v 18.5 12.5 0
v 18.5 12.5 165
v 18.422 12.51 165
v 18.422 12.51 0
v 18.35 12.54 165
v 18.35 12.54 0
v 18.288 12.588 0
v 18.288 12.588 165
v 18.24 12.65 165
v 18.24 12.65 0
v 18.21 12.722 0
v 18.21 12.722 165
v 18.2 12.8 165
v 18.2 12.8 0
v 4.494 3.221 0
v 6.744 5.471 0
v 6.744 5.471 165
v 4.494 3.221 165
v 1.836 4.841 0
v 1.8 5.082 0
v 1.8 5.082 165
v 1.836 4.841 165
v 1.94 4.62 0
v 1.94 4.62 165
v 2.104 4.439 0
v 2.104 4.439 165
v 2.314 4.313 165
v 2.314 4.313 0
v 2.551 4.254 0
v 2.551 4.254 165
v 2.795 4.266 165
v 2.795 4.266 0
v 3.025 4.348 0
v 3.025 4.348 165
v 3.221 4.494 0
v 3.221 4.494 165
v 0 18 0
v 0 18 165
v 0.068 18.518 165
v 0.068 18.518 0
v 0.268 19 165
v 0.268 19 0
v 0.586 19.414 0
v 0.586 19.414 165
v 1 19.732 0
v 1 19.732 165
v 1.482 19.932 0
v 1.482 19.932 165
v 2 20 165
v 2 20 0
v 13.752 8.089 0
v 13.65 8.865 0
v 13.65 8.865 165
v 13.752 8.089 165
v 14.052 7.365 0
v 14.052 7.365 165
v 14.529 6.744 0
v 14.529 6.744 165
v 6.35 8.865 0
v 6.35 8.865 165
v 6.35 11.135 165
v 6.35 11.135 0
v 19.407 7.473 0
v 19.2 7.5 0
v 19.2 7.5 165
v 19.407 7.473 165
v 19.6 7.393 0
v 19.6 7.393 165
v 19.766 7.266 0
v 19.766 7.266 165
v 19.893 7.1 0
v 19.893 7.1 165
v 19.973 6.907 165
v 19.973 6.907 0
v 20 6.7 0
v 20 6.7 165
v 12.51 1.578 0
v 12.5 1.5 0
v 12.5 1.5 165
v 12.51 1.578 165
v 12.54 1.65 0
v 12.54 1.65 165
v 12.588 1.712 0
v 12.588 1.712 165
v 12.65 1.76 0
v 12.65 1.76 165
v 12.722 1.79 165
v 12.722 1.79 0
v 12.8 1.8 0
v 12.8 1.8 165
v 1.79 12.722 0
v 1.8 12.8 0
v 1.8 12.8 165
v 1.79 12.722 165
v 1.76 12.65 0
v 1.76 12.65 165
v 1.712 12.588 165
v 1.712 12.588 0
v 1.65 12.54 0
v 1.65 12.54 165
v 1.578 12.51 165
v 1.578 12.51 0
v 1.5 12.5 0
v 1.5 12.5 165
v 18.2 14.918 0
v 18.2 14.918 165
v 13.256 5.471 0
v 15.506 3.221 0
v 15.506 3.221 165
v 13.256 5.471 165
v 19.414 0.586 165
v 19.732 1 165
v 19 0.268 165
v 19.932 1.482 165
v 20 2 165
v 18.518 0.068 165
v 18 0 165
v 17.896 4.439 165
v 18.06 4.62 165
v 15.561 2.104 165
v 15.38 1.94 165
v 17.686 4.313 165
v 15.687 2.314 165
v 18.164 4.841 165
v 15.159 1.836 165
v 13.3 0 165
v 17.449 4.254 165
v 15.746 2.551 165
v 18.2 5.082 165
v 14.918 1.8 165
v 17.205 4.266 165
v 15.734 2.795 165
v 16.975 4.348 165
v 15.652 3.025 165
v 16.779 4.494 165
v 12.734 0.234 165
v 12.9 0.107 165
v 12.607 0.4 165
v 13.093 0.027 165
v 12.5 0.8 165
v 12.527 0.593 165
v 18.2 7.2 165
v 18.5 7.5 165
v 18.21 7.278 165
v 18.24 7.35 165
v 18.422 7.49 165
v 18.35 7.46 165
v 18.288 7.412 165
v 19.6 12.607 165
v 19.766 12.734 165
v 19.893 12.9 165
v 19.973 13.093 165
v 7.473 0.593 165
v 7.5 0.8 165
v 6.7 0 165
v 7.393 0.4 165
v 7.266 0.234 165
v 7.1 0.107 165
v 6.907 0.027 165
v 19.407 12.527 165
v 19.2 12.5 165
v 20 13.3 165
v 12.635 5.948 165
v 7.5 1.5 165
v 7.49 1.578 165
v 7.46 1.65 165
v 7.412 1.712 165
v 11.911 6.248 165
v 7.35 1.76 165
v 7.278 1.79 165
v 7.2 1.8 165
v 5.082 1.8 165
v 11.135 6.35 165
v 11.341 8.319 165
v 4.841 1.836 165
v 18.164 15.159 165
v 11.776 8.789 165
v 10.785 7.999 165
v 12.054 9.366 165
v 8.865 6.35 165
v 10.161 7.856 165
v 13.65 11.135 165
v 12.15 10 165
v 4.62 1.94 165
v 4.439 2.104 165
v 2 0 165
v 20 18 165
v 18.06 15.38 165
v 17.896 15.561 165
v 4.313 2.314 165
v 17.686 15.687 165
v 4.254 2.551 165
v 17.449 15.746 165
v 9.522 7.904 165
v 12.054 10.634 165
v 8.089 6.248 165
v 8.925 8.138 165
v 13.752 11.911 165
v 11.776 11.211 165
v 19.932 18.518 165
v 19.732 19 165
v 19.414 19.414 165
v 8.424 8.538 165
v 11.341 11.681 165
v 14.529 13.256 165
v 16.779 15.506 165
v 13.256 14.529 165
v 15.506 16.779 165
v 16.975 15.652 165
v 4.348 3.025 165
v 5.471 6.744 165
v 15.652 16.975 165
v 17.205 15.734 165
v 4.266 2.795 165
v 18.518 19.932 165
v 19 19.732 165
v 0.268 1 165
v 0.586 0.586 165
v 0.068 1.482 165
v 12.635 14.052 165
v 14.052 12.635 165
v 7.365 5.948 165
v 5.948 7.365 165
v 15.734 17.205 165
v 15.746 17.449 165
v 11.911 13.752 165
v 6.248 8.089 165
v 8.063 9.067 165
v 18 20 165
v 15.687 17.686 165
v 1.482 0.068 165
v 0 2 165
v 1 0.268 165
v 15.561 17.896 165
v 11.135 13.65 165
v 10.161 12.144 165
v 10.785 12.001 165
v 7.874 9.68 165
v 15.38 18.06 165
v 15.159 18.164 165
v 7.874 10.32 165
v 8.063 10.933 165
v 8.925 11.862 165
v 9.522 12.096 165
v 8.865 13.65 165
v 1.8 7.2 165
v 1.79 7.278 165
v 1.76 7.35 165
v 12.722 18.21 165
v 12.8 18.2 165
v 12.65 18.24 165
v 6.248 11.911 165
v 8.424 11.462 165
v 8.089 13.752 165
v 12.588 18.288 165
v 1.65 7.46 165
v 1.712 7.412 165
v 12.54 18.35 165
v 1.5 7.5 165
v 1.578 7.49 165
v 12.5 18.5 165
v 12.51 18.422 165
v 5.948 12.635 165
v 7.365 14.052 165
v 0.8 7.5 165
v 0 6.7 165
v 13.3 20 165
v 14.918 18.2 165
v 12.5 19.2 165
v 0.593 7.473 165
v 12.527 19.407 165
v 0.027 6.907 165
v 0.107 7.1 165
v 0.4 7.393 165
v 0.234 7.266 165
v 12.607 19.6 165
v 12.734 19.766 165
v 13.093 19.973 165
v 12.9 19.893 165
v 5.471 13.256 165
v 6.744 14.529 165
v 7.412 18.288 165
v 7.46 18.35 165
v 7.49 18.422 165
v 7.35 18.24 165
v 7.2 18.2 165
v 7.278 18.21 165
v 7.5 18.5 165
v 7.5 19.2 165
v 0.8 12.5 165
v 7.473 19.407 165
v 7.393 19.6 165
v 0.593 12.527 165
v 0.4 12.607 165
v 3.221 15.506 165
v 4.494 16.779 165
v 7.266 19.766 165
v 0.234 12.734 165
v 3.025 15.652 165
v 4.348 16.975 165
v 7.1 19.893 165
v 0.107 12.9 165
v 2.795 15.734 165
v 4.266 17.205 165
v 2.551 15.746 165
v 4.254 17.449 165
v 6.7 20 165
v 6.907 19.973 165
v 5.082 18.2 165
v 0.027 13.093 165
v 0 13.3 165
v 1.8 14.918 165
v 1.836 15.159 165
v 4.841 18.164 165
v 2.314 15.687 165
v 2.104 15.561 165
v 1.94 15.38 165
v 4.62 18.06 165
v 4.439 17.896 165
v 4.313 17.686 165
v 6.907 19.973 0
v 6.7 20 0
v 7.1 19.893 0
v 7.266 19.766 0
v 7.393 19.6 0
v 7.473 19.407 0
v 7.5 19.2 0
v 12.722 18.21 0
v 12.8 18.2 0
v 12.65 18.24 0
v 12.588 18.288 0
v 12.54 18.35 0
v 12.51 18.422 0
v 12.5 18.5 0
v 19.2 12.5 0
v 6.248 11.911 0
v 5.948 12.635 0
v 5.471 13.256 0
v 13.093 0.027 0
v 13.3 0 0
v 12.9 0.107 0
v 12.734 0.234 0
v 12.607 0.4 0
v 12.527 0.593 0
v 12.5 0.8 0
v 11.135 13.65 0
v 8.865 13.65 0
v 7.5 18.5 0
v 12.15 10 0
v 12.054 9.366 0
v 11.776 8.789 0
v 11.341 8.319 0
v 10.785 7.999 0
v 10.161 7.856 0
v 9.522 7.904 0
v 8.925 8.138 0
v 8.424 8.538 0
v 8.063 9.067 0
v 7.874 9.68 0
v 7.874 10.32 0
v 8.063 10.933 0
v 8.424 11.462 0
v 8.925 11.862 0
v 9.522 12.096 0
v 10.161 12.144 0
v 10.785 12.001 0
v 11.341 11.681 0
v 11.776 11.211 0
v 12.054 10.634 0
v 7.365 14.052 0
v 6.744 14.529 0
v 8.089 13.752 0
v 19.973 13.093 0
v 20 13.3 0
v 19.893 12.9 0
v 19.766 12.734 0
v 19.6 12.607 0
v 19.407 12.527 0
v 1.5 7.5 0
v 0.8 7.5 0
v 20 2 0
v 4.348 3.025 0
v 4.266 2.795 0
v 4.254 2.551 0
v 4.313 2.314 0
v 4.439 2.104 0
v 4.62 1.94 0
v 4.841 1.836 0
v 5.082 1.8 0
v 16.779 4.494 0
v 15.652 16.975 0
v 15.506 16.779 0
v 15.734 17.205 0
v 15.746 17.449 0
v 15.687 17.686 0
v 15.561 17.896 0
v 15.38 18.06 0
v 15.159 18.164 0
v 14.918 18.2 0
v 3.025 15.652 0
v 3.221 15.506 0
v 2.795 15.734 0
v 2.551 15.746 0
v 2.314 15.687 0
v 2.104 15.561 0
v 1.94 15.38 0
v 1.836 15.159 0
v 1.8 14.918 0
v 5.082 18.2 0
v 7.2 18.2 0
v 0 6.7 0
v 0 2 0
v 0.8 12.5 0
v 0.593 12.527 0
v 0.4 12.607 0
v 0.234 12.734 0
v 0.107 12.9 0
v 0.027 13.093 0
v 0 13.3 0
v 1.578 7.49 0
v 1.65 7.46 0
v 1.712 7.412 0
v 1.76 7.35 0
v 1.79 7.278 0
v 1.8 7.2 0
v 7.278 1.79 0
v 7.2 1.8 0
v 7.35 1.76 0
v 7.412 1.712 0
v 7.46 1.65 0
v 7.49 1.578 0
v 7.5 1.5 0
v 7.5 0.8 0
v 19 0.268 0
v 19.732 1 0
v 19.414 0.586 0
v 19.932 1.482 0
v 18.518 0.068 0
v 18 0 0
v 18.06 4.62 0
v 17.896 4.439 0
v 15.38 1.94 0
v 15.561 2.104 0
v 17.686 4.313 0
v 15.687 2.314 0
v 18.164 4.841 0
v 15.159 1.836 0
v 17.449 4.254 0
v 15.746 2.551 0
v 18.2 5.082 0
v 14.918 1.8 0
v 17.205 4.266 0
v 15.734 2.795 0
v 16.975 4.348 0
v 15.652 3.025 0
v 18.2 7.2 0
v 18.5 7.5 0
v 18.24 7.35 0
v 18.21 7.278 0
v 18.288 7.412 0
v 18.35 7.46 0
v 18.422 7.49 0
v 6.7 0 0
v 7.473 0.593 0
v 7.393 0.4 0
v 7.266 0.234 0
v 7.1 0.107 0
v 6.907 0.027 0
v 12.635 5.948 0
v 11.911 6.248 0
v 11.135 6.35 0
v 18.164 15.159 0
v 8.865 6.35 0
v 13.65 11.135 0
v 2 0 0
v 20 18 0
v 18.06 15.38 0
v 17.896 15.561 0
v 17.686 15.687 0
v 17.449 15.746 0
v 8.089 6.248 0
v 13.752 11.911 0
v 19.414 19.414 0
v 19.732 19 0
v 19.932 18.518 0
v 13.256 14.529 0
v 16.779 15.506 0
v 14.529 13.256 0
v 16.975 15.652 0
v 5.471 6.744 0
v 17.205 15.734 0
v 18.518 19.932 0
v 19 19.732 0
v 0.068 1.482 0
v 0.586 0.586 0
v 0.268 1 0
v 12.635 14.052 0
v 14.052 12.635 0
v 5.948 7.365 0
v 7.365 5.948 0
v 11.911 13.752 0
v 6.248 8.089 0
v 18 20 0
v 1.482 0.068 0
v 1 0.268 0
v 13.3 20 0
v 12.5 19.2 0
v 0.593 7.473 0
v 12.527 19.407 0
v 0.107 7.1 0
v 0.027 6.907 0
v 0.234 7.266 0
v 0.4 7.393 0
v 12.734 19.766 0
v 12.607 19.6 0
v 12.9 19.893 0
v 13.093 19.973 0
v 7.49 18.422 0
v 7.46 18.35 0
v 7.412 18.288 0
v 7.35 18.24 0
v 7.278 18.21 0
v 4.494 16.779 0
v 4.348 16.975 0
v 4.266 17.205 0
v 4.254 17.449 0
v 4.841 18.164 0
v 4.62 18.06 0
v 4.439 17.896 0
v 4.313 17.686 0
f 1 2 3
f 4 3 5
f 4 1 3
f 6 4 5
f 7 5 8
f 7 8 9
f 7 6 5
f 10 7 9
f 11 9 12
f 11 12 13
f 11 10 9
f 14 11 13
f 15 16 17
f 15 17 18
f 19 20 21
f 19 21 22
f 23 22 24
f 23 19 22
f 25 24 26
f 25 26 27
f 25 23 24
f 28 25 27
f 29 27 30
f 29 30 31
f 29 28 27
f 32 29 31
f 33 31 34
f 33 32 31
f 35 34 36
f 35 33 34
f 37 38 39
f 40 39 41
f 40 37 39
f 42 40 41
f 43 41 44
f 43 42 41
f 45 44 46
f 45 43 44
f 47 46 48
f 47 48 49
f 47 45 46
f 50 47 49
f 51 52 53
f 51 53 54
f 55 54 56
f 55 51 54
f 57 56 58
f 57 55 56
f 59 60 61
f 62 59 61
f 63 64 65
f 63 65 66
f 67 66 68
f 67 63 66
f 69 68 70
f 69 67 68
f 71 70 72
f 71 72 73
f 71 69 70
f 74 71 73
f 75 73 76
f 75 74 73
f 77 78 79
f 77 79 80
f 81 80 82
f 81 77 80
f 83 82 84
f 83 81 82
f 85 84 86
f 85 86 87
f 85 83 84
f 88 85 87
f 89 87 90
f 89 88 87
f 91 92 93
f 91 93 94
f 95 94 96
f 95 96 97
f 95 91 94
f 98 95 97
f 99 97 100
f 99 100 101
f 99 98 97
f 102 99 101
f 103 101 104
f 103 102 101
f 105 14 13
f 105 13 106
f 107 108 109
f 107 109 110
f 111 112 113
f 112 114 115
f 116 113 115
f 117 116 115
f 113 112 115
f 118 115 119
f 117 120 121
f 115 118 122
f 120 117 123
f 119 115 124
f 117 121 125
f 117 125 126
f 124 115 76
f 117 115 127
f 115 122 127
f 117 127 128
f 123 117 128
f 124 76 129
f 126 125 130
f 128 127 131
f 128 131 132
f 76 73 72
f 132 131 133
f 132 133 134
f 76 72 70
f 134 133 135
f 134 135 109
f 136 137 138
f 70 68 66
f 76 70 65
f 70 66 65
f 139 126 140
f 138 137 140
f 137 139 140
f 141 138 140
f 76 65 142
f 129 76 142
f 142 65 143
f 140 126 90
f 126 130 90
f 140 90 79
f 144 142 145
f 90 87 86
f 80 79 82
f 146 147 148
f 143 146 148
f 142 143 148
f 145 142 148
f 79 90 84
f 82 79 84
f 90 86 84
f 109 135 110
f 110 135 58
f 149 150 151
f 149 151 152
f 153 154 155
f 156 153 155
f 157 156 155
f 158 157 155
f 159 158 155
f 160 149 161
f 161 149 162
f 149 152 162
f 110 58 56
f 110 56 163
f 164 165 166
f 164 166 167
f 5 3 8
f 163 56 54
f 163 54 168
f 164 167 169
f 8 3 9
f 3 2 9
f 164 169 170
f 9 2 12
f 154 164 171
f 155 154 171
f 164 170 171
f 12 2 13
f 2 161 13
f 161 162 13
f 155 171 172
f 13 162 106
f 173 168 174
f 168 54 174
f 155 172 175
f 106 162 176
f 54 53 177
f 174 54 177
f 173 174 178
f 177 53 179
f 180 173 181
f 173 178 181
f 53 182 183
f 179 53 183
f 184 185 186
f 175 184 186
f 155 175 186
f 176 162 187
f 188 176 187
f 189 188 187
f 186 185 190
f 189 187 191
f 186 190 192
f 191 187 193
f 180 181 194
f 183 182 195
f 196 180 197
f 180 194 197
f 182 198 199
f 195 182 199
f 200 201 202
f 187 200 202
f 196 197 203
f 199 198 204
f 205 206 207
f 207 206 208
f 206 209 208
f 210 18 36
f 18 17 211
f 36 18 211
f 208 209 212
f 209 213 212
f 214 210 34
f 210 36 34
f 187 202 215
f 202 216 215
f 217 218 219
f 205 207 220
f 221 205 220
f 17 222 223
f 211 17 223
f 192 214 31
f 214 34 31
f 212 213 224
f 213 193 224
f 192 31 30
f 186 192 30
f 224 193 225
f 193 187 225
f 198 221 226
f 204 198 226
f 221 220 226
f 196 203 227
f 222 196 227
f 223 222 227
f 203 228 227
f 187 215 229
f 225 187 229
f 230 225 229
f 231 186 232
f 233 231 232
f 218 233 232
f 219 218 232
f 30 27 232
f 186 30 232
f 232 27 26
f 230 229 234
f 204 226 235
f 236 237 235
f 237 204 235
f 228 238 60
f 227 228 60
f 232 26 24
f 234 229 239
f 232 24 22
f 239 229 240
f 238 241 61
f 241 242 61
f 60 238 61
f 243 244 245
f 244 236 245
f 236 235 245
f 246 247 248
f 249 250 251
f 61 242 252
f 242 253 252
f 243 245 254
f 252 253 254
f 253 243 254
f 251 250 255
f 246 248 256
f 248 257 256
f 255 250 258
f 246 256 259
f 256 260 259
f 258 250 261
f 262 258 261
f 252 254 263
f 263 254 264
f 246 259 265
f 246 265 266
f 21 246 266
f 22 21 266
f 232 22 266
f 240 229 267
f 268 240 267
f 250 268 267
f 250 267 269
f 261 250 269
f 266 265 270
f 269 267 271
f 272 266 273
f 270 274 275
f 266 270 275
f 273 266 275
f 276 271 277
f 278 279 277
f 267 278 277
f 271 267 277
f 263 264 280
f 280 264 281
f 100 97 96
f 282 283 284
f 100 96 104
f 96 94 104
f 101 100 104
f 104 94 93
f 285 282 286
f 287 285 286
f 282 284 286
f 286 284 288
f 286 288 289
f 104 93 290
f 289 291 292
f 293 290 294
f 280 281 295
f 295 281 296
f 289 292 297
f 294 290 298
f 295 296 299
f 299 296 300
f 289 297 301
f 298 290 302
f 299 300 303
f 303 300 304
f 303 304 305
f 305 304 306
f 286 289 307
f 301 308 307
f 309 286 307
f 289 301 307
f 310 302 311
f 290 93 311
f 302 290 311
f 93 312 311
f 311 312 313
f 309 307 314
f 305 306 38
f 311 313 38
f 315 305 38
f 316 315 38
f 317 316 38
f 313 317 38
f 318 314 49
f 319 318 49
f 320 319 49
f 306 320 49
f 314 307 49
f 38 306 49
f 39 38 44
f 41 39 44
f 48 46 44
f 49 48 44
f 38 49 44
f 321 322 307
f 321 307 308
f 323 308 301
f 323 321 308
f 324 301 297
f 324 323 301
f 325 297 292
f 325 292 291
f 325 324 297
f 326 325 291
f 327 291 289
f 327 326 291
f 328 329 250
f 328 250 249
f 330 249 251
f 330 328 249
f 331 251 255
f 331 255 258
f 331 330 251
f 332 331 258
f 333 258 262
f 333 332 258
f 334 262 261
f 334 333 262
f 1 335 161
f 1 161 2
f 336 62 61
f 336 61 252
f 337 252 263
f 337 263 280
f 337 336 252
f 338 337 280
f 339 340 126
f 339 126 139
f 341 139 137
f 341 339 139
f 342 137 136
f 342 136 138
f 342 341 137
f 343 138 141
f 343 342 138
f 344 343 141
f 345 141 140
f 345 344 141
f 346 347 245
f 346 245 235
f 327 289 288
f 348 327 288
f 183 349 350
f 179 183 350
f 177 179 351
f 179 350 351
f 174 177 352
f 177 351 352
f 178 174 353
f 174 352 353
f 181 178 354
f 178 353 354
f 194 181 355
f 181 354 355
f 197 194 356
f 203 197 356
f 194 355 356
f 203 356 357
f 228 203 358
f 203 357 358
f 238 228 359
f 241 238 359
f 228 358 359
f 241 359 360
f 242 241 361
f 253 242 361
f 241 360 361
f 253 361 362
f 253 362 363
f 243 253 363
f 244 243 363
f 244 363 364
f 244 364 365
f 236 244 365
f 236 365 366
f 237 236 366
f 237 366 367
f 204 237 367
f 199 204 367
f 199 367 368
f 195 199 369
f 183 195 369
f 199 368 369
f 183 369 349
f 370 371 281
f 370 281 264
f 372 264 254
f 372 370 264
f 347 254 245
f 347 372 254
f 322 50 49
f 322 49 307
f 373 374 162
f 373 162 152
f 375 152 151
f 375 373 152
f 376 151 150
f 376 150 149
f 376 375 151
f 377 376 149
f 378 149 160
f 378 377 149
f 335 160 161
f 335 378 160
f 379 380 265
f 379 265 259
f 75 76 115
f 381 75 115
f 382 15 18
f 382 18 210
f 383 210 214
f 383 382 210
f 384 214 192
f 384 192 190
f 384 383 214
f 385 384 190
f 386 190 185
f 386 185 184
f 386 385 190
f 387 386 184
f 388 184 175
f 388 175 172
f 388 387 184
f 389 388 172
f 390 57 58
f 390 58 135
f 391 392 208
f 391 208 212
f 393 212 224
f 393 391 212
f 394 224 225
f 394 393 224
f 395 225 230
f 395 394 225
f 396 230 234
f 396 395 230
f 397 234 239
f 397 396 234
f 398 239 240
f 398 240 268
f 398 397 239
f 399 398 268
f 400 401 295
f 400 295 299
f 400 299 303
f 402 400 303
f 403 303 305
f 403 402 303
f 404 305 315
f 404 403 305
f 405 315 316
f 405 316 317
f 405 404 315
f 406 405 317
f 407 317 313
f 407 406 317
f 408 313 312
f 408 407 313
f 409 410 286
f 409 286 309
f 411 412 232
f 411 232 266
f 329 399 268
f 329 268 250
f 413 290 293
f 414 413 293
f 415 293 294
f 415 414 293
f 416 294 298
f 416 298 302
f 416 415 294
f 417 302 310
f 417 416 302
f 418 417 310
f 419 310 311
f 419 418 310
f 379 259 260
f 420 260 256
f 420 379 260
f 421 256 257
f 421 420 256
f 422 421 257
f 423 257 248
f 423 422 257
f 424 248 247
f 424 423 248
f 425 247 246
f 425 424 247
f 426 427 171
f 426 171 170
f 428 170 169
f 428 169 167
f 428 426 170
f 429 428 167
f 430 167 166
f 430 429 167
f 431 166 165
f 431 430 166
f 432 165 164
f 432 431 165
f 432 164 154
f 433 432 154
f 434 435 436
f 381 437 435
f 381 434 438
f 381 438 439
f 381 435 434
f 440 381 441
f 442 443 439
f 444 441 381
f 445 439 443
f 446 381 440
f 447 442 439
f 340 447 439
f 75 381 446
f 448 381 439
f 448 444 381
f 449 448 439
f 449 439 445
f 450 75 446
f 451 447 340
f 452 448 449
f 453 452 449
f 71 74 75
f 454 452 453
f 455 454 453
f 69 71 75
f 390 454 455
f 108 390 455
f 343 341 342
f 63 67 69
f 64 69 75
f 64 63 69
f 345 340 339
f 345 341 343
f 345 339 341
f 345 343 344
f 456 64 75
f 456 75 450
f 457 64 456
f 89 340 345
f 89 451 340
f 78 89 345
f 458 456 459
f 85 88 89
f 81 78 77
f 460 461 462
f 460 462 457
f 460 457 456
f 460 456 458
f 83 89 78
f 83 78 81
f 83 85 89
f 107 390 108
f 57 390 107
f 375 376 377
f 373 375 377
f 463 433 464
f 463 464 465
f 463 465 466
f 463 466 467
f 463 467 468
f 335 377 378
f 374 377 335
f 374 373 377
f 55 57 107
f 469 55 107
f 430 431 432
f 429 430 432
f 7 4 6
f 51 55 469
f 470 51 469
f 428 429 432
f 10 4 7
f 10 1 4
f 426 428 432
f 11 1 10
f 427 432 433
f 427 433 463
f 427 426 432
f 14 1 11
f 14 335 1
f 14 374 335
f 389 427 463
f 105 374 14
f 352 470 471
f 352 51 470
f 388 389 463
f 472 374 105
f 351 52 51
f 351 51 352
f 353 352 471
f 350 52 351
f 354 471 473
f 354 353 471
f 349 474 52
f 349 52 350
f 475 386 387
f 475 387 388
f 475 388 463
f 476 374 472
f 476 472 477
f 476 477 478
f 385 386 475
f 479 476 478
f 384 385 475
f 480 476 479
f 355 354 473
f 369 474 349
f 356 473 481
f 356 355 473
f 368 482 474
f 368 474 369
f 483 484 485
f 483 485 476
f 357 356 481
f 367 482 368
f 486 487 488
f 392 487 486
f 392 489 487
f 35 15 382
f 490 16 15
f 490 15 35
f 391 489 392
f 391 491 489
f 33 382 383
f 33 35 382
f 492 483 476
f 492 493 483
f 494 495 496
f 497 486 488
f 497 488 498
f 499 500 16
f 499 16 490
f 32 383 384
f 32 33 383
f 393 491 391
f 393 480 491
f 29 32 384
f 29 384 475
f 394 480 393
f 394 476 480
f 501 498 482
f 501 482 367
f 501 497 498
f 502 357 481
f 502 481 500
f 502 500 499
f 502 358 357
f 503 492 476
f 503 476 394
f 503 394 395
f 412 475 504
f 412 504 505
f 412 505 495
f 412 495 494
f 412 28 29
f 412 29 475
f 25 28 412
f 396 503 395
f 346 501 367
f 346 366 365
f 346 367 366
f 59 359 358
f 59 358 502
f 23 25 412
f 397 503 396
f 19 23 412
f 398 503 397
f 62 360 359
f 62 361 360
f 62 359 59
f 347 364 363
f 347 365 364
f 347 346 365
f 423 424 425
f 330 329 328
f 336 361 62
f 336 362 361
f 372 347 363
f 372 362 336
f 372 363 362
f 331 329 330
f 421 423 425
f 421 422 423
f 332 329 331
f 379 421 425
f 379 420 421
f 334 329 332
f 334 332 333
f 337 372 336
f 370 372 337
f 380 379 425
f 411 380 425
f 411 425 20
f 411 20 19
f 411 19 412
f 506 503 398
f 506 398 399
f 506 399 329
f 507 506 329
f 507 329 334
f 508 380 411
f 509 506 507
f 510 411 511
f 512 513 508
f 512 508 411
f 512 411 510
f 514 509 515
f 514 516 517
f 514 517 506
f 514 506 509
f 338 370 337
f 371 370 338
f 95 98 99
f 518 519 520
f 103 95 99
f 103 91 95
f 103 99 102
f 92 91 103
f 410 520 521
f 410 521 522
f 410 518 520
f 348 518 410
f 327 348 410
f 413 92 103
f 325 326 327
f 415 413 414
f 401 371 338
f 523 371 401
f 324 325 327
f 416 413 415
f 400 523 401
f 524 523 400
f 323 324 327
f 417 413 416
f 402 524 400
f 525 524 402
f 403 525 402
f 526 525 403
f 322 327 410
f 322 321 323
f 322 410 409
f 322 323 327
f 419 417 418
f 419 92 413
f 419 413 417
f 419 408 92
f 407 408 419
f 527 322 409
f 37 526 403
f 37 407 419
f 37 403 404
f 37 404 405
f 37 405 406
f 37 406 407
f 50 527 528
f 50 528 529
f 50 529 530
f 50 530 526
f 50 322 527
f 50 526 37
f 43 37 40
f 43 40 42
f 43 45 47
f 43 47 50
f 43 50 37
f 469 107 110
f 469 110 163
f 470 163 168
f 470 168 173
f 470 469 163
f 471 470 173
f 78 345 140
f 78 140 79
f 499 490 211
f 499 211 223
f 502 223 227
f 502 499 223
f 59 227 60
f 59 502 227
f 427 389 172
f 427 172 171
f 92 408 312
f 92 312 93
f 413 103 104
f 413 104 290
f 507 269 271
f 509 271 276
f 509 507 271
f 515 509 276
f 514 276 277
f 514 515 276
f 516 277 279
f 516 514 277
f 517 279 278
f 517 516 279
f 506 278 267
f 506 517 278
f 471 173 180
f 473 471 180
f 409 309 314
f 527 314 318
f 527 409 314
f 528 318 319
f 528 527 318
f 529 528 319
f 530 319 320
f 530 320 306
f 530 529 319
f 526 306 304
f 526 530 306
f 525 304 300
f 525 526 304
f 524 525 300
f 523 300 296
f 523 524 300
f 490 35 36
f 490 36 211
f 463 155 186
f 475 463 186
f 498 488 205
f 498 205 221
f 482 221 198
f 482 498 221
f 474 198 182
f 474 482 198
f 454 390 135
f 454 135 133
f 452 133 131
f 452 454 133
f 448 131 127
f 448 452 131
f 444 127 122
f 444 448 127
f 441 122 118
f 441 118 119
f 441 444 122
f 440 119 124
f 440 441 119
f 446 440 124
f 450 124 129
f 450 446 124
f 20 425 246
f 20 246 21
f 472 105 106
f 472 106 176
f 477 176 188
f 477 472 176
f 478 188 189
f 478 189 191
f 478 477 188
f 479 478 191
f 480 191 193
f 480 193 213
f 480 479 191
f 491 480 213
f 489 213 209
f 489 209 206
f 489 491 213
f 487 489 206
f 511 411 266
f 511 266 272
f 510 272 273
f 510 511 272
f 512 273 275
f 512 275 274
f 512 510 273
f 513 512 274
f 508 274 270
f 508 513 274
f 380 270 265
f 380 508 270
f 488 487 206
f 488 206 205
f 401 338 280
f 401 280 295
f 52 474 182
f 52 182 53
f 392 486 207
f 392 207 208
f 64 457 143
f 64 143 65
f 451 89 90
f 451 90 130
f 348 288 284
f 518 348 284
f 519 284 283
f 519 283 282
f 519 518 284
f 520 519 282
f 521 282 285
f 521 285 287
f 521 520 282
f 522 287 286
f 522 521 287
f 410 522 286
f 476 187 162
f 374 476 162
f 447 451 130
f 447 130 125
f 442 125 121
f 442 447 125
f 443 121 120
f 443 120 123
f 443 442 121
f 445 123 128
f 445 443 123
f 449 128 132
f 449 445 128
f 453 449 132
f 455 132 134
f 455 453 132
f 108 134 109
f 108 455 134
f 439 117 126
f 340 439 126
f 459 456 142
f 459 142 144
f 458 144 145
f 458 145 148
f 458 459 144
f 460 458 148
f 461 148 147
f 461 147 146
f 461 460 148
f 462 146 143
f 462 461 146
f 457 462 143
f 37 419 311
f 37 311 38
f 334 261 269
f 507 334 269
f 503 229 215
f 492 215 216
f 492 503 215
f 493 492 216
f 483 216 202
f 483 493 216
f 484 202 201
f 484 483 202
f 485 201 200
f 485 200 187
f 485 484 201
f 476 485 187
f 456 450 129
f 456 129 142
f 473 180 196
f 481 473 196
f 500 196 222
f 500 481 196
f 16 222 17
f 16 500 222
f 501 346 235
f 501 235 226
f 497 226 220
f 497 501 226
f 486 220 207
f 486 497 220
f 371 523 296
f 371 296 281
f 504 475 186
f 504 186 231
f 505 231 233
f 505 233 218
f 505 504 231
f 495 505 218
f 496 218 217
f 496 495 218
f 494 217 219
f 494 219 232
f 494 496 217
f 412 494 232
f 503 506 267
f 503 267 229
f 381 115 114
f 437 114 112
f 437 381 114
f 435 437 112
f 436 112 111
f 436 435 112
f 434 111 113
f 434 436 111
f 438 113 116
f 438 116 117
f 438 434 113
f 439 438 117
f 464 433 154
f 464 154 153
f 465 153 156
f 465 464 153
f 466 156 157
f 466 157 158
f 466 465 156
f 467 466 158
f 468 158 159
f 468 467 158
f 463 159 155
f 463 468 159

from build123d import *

# Parameters (mm, degrees)
ESQUISSE1_R        = 2.15
BOSS_EXTRU_1_DEPTH = 165


with BuildPart() as part:
    # Esquisse1 → Boss.-Extru.1 (new body)
    with BuildSketch(Plane(origin=(0, 0, 0), x_dir=(-1, 0, 0), z_dir=(0, 0, -1))):
        with BuildLine():
            Line((-12.499999997, 0.800000003), (-12.499999998, 1.500000003))
            ThreePointArc((-12.499999998, 1.500000003), (-12.587867964, 1.712132039), (-12.8, 1.800000005))
            Line((-12.8, 1.800000005), (-14.9175884, 1.800000005))
            ThreePointArc((-14.9175884, 1.800000005), (-15.686636444, 2.31386148), (-15.50619229, 3.2210155))
            Line((-15.50619229, 3.2210155), (-13.25588745, 5.47132034))
            ThreePointArc((-13.25588745, 5.47132034), (-12.282617404, 6.121638593), (-11.134567108, 6.349999996))
            Line((-11.134567108, 6.349999996), (-8.865432907, 6.349999996))
            ThreePointArc((-8.865432907, 6.349999996), (-7.717382611, 6.121638594), (-6.744112567, 5.471320341))
            Line((-6.744112567, 5.471320341), (-4.493807729, 3.221015503))
            ThreePointArc((-4.493807729, 3.221015503), (-4.313363575, 2.313861481), (-5.082411621, 1.800000005))
            Line((-5.082411621, 1.800000005), (-7.20000001, 1.800000005))
            ThreePointArc((-7.20000001, 1.800000005), (-7.412132045, 1.71213204), (-7.50000001, 1.500000005))
            Line((-7.50000001, 1.500000005), (-7.50000001, 0.8))
            ThreePointArc((-7.50000001, 0.8), (-7.265685435, 0.234314575), (-6.70000001, 0))
            Line((-6.70000001, 0), (-2, 0))
            ThreePointArc((-2, 0), (-0.585786438, 0.585786438), (0, 2))
            Line((0, 2), (0, 6.699999998))
            ThreePointArc((0, 6.699999998), (-0.234314576, 7.265685424), (-0.800000003, 7.5))
            Line((-0.800000003, 7.5), (-1.50000001, 7.5))
            ThreePointArc((-1.50000001, 7.5), (-1.712132046, 7.412132033), (-1.800000013, 7.199999997))
            Line((-1.800000013, 7.199999997), (-1.800000013, 5.082411603))
            ThreePointArc((-1.800000013, 5.082411603), (-2.313861487, 4.31336356), (-3.221015507, 4.493807713))
            Line((-3.221015507, 4.493807713), (-5.471320347, 6.744112553))
            ThreePointArc((-5.471320347, 6.744112553), (-6.1216386, 7.717382599), (-6.350000003, 8.865432896))
            Line((-6.350000003, 8.865432896), (-6.350000003, 11.134567102))
            ThreePointArc((-6.350000003, 11.134567102), (-6.121638601, 12.282617397), (-5.471320348, 13.255887442))
            Line((-5.471320348, 13.255887442), (-3.221015512, 15.506192278))
            ThreePointArc((-3.221015512, 15.506192278), (-2.313861489, 15.686636432), (-1.800000013, 14.917588386))
            Line((-1.800000013, 14.917588386), (-1.800000013, 12.799999998))
            ThreePointArc((-1.800000013, 12.799999998), (-1.712132047, 12.587867963), (-1.500000013, 12.499999997))
            Line((-1.500000013, 12.499999997), (-0.8, 12.499999997))
            ThreePointArc((-0.8, 12.499999997), (-0.234314575, 12.734314573), (0, 13.299999998))
            Line((0, 13.299999998), (0, 18))
            ThreePointArc((0, 18), (-0.585786438, 19.414213562), (-2, 20))
            Line((-2, 20), (-6.700000008, 20))
            ThreePointArc((-6.700000008, 20), (-7.265685435, 19.765685424), (-7.50000001, 19.199999998))
            Line((-7.50000001, 19.199999998), (-7.50000001, 18.500000005))
            ThreePointArc((-7.50000001, 18.500000005), (-7.412132044, 18.287867969), (-7.200000008, 18.200000003))
            Line((-7.200000008, 18.200000003), (-5.082411594, 18.200000003))
            ThreePointArc((-5.082411594, 18.200000003), (-4.313363546, 17.686138526), (-4.493807701, 16.778984501))
            Line((-4.493807701, 16.778984501), (-6.744112542, 14.528679659))
            ThreePointArc((-6.744112542, 14.528679659), (-7.717382588, 13.878361406), (-8.865432885, 13.650000003))
            Line((-8.865432885, 13.650000003), (-11.134567112, 13.650000003))
            ThreePointArc((-11.134567112, 13.650000003), (-12.282617407, 13.878361405), (-13.255887452, 14.528679658))
            Line((-13.255887452, 14.528679658), (-15.506192292, 16.778984498))
            ThreePointArc((-15.506192292, 16.778984498), (-15.686636447, 17.686138525), (-14.917588397, 18.200000002))
            Line((-14.917588397, 18.200000002), (-12.799999998, 18.200000003))
            ThreePointArc((-12.799999998, 18.200000003), (-12.587867963, 18.287867968), (-12.499999997, 18.500000002))
            Line((-12.499999997, 18.500000002), (-12.499999997, 19.2))
            ThreePointArc((-12.499999997, 19.2), (-12.734314573, 19.765685425), (-13.299999998, 20))
            Line((-13.299999998, 20), (-18, 20))
            ThreePointArc((-18, 20), (-19.414213562, 19.414213562), (-20, 18))
            Line((-20, 18), (-20, 13.3))
            ThreePointArc((-20, 13.3), (-19.765685424, 12.734314573), (-19.199999998, 12.499999997))
            Line((-19.199999998, 12.499999997), (-18.500000003, 12.499999997))
            ThreePointArc((-18.500000003, 12.499999997), (-18.287867967, 12.587867964), (-18.2, 12.8))
            Line((-18.2, 12.8), (-18.2, 14.91758839))
            ThreePointArc((-18.2, 14.91758839), (-17.686138526, 15.686636434), (-16.778984506, 15.50619228))
            Line((-16.778984506, 15.50619228), (-14.528679657, 13.255887431))
            ThreePointArc((-14.528679657, 13.255887431), (-13.878361403, 12.282617385), (-13.650000001, 11.134567088))
            Line((-13.650000001, 11.134567088), (-13.650000001, 8.865432886))
            ThreePointArc((-13.650000001, 8.865432886), (-13.878361403, 7.717382591), (-14.528679656, 6.744112546))
            Line((-14.528679656, 6.744112546), (-16.778984496, 4.493807706))
            ThreePointArc((-16.778984496, 4.493807706), (-17.686138522, 4.313363551), (-18.2, 5.0824116))
            Line((-18.2, 5.0824116), (-18.2, 7.2))
            ThreePointArc((-18.2, 7.2), (-18.287867966, 7.412132034), (-18.5, 7.5))
            Line((-18.5, 7.5), (-19.2, 7.5))
            ThreePointArc((-19.2, 7.5), (-19.765685425, 7.265685425), (-20, 6.7))
            Line((-20, 6.7), (-20, 2))
            ThreePointArc((-20, 2), (-19.414213562, 0.585786438), (-18, 0))
            Line((-18, 0), (-13.3, 0))
            ThreePointArc((-13.3, 0), (-12.734314573, 0.234314576), (-12.499999997, 0.800000003))
        make_face()
        with Locations(Location((-10, 10, 0), (0, 0, 180))):
            Circle(ESQUISSE1_R, mode=Mode.SUBTRACT)
    extrude(amount=-BOSS_EXTRU_1_DEPTH)


solid = part.part
